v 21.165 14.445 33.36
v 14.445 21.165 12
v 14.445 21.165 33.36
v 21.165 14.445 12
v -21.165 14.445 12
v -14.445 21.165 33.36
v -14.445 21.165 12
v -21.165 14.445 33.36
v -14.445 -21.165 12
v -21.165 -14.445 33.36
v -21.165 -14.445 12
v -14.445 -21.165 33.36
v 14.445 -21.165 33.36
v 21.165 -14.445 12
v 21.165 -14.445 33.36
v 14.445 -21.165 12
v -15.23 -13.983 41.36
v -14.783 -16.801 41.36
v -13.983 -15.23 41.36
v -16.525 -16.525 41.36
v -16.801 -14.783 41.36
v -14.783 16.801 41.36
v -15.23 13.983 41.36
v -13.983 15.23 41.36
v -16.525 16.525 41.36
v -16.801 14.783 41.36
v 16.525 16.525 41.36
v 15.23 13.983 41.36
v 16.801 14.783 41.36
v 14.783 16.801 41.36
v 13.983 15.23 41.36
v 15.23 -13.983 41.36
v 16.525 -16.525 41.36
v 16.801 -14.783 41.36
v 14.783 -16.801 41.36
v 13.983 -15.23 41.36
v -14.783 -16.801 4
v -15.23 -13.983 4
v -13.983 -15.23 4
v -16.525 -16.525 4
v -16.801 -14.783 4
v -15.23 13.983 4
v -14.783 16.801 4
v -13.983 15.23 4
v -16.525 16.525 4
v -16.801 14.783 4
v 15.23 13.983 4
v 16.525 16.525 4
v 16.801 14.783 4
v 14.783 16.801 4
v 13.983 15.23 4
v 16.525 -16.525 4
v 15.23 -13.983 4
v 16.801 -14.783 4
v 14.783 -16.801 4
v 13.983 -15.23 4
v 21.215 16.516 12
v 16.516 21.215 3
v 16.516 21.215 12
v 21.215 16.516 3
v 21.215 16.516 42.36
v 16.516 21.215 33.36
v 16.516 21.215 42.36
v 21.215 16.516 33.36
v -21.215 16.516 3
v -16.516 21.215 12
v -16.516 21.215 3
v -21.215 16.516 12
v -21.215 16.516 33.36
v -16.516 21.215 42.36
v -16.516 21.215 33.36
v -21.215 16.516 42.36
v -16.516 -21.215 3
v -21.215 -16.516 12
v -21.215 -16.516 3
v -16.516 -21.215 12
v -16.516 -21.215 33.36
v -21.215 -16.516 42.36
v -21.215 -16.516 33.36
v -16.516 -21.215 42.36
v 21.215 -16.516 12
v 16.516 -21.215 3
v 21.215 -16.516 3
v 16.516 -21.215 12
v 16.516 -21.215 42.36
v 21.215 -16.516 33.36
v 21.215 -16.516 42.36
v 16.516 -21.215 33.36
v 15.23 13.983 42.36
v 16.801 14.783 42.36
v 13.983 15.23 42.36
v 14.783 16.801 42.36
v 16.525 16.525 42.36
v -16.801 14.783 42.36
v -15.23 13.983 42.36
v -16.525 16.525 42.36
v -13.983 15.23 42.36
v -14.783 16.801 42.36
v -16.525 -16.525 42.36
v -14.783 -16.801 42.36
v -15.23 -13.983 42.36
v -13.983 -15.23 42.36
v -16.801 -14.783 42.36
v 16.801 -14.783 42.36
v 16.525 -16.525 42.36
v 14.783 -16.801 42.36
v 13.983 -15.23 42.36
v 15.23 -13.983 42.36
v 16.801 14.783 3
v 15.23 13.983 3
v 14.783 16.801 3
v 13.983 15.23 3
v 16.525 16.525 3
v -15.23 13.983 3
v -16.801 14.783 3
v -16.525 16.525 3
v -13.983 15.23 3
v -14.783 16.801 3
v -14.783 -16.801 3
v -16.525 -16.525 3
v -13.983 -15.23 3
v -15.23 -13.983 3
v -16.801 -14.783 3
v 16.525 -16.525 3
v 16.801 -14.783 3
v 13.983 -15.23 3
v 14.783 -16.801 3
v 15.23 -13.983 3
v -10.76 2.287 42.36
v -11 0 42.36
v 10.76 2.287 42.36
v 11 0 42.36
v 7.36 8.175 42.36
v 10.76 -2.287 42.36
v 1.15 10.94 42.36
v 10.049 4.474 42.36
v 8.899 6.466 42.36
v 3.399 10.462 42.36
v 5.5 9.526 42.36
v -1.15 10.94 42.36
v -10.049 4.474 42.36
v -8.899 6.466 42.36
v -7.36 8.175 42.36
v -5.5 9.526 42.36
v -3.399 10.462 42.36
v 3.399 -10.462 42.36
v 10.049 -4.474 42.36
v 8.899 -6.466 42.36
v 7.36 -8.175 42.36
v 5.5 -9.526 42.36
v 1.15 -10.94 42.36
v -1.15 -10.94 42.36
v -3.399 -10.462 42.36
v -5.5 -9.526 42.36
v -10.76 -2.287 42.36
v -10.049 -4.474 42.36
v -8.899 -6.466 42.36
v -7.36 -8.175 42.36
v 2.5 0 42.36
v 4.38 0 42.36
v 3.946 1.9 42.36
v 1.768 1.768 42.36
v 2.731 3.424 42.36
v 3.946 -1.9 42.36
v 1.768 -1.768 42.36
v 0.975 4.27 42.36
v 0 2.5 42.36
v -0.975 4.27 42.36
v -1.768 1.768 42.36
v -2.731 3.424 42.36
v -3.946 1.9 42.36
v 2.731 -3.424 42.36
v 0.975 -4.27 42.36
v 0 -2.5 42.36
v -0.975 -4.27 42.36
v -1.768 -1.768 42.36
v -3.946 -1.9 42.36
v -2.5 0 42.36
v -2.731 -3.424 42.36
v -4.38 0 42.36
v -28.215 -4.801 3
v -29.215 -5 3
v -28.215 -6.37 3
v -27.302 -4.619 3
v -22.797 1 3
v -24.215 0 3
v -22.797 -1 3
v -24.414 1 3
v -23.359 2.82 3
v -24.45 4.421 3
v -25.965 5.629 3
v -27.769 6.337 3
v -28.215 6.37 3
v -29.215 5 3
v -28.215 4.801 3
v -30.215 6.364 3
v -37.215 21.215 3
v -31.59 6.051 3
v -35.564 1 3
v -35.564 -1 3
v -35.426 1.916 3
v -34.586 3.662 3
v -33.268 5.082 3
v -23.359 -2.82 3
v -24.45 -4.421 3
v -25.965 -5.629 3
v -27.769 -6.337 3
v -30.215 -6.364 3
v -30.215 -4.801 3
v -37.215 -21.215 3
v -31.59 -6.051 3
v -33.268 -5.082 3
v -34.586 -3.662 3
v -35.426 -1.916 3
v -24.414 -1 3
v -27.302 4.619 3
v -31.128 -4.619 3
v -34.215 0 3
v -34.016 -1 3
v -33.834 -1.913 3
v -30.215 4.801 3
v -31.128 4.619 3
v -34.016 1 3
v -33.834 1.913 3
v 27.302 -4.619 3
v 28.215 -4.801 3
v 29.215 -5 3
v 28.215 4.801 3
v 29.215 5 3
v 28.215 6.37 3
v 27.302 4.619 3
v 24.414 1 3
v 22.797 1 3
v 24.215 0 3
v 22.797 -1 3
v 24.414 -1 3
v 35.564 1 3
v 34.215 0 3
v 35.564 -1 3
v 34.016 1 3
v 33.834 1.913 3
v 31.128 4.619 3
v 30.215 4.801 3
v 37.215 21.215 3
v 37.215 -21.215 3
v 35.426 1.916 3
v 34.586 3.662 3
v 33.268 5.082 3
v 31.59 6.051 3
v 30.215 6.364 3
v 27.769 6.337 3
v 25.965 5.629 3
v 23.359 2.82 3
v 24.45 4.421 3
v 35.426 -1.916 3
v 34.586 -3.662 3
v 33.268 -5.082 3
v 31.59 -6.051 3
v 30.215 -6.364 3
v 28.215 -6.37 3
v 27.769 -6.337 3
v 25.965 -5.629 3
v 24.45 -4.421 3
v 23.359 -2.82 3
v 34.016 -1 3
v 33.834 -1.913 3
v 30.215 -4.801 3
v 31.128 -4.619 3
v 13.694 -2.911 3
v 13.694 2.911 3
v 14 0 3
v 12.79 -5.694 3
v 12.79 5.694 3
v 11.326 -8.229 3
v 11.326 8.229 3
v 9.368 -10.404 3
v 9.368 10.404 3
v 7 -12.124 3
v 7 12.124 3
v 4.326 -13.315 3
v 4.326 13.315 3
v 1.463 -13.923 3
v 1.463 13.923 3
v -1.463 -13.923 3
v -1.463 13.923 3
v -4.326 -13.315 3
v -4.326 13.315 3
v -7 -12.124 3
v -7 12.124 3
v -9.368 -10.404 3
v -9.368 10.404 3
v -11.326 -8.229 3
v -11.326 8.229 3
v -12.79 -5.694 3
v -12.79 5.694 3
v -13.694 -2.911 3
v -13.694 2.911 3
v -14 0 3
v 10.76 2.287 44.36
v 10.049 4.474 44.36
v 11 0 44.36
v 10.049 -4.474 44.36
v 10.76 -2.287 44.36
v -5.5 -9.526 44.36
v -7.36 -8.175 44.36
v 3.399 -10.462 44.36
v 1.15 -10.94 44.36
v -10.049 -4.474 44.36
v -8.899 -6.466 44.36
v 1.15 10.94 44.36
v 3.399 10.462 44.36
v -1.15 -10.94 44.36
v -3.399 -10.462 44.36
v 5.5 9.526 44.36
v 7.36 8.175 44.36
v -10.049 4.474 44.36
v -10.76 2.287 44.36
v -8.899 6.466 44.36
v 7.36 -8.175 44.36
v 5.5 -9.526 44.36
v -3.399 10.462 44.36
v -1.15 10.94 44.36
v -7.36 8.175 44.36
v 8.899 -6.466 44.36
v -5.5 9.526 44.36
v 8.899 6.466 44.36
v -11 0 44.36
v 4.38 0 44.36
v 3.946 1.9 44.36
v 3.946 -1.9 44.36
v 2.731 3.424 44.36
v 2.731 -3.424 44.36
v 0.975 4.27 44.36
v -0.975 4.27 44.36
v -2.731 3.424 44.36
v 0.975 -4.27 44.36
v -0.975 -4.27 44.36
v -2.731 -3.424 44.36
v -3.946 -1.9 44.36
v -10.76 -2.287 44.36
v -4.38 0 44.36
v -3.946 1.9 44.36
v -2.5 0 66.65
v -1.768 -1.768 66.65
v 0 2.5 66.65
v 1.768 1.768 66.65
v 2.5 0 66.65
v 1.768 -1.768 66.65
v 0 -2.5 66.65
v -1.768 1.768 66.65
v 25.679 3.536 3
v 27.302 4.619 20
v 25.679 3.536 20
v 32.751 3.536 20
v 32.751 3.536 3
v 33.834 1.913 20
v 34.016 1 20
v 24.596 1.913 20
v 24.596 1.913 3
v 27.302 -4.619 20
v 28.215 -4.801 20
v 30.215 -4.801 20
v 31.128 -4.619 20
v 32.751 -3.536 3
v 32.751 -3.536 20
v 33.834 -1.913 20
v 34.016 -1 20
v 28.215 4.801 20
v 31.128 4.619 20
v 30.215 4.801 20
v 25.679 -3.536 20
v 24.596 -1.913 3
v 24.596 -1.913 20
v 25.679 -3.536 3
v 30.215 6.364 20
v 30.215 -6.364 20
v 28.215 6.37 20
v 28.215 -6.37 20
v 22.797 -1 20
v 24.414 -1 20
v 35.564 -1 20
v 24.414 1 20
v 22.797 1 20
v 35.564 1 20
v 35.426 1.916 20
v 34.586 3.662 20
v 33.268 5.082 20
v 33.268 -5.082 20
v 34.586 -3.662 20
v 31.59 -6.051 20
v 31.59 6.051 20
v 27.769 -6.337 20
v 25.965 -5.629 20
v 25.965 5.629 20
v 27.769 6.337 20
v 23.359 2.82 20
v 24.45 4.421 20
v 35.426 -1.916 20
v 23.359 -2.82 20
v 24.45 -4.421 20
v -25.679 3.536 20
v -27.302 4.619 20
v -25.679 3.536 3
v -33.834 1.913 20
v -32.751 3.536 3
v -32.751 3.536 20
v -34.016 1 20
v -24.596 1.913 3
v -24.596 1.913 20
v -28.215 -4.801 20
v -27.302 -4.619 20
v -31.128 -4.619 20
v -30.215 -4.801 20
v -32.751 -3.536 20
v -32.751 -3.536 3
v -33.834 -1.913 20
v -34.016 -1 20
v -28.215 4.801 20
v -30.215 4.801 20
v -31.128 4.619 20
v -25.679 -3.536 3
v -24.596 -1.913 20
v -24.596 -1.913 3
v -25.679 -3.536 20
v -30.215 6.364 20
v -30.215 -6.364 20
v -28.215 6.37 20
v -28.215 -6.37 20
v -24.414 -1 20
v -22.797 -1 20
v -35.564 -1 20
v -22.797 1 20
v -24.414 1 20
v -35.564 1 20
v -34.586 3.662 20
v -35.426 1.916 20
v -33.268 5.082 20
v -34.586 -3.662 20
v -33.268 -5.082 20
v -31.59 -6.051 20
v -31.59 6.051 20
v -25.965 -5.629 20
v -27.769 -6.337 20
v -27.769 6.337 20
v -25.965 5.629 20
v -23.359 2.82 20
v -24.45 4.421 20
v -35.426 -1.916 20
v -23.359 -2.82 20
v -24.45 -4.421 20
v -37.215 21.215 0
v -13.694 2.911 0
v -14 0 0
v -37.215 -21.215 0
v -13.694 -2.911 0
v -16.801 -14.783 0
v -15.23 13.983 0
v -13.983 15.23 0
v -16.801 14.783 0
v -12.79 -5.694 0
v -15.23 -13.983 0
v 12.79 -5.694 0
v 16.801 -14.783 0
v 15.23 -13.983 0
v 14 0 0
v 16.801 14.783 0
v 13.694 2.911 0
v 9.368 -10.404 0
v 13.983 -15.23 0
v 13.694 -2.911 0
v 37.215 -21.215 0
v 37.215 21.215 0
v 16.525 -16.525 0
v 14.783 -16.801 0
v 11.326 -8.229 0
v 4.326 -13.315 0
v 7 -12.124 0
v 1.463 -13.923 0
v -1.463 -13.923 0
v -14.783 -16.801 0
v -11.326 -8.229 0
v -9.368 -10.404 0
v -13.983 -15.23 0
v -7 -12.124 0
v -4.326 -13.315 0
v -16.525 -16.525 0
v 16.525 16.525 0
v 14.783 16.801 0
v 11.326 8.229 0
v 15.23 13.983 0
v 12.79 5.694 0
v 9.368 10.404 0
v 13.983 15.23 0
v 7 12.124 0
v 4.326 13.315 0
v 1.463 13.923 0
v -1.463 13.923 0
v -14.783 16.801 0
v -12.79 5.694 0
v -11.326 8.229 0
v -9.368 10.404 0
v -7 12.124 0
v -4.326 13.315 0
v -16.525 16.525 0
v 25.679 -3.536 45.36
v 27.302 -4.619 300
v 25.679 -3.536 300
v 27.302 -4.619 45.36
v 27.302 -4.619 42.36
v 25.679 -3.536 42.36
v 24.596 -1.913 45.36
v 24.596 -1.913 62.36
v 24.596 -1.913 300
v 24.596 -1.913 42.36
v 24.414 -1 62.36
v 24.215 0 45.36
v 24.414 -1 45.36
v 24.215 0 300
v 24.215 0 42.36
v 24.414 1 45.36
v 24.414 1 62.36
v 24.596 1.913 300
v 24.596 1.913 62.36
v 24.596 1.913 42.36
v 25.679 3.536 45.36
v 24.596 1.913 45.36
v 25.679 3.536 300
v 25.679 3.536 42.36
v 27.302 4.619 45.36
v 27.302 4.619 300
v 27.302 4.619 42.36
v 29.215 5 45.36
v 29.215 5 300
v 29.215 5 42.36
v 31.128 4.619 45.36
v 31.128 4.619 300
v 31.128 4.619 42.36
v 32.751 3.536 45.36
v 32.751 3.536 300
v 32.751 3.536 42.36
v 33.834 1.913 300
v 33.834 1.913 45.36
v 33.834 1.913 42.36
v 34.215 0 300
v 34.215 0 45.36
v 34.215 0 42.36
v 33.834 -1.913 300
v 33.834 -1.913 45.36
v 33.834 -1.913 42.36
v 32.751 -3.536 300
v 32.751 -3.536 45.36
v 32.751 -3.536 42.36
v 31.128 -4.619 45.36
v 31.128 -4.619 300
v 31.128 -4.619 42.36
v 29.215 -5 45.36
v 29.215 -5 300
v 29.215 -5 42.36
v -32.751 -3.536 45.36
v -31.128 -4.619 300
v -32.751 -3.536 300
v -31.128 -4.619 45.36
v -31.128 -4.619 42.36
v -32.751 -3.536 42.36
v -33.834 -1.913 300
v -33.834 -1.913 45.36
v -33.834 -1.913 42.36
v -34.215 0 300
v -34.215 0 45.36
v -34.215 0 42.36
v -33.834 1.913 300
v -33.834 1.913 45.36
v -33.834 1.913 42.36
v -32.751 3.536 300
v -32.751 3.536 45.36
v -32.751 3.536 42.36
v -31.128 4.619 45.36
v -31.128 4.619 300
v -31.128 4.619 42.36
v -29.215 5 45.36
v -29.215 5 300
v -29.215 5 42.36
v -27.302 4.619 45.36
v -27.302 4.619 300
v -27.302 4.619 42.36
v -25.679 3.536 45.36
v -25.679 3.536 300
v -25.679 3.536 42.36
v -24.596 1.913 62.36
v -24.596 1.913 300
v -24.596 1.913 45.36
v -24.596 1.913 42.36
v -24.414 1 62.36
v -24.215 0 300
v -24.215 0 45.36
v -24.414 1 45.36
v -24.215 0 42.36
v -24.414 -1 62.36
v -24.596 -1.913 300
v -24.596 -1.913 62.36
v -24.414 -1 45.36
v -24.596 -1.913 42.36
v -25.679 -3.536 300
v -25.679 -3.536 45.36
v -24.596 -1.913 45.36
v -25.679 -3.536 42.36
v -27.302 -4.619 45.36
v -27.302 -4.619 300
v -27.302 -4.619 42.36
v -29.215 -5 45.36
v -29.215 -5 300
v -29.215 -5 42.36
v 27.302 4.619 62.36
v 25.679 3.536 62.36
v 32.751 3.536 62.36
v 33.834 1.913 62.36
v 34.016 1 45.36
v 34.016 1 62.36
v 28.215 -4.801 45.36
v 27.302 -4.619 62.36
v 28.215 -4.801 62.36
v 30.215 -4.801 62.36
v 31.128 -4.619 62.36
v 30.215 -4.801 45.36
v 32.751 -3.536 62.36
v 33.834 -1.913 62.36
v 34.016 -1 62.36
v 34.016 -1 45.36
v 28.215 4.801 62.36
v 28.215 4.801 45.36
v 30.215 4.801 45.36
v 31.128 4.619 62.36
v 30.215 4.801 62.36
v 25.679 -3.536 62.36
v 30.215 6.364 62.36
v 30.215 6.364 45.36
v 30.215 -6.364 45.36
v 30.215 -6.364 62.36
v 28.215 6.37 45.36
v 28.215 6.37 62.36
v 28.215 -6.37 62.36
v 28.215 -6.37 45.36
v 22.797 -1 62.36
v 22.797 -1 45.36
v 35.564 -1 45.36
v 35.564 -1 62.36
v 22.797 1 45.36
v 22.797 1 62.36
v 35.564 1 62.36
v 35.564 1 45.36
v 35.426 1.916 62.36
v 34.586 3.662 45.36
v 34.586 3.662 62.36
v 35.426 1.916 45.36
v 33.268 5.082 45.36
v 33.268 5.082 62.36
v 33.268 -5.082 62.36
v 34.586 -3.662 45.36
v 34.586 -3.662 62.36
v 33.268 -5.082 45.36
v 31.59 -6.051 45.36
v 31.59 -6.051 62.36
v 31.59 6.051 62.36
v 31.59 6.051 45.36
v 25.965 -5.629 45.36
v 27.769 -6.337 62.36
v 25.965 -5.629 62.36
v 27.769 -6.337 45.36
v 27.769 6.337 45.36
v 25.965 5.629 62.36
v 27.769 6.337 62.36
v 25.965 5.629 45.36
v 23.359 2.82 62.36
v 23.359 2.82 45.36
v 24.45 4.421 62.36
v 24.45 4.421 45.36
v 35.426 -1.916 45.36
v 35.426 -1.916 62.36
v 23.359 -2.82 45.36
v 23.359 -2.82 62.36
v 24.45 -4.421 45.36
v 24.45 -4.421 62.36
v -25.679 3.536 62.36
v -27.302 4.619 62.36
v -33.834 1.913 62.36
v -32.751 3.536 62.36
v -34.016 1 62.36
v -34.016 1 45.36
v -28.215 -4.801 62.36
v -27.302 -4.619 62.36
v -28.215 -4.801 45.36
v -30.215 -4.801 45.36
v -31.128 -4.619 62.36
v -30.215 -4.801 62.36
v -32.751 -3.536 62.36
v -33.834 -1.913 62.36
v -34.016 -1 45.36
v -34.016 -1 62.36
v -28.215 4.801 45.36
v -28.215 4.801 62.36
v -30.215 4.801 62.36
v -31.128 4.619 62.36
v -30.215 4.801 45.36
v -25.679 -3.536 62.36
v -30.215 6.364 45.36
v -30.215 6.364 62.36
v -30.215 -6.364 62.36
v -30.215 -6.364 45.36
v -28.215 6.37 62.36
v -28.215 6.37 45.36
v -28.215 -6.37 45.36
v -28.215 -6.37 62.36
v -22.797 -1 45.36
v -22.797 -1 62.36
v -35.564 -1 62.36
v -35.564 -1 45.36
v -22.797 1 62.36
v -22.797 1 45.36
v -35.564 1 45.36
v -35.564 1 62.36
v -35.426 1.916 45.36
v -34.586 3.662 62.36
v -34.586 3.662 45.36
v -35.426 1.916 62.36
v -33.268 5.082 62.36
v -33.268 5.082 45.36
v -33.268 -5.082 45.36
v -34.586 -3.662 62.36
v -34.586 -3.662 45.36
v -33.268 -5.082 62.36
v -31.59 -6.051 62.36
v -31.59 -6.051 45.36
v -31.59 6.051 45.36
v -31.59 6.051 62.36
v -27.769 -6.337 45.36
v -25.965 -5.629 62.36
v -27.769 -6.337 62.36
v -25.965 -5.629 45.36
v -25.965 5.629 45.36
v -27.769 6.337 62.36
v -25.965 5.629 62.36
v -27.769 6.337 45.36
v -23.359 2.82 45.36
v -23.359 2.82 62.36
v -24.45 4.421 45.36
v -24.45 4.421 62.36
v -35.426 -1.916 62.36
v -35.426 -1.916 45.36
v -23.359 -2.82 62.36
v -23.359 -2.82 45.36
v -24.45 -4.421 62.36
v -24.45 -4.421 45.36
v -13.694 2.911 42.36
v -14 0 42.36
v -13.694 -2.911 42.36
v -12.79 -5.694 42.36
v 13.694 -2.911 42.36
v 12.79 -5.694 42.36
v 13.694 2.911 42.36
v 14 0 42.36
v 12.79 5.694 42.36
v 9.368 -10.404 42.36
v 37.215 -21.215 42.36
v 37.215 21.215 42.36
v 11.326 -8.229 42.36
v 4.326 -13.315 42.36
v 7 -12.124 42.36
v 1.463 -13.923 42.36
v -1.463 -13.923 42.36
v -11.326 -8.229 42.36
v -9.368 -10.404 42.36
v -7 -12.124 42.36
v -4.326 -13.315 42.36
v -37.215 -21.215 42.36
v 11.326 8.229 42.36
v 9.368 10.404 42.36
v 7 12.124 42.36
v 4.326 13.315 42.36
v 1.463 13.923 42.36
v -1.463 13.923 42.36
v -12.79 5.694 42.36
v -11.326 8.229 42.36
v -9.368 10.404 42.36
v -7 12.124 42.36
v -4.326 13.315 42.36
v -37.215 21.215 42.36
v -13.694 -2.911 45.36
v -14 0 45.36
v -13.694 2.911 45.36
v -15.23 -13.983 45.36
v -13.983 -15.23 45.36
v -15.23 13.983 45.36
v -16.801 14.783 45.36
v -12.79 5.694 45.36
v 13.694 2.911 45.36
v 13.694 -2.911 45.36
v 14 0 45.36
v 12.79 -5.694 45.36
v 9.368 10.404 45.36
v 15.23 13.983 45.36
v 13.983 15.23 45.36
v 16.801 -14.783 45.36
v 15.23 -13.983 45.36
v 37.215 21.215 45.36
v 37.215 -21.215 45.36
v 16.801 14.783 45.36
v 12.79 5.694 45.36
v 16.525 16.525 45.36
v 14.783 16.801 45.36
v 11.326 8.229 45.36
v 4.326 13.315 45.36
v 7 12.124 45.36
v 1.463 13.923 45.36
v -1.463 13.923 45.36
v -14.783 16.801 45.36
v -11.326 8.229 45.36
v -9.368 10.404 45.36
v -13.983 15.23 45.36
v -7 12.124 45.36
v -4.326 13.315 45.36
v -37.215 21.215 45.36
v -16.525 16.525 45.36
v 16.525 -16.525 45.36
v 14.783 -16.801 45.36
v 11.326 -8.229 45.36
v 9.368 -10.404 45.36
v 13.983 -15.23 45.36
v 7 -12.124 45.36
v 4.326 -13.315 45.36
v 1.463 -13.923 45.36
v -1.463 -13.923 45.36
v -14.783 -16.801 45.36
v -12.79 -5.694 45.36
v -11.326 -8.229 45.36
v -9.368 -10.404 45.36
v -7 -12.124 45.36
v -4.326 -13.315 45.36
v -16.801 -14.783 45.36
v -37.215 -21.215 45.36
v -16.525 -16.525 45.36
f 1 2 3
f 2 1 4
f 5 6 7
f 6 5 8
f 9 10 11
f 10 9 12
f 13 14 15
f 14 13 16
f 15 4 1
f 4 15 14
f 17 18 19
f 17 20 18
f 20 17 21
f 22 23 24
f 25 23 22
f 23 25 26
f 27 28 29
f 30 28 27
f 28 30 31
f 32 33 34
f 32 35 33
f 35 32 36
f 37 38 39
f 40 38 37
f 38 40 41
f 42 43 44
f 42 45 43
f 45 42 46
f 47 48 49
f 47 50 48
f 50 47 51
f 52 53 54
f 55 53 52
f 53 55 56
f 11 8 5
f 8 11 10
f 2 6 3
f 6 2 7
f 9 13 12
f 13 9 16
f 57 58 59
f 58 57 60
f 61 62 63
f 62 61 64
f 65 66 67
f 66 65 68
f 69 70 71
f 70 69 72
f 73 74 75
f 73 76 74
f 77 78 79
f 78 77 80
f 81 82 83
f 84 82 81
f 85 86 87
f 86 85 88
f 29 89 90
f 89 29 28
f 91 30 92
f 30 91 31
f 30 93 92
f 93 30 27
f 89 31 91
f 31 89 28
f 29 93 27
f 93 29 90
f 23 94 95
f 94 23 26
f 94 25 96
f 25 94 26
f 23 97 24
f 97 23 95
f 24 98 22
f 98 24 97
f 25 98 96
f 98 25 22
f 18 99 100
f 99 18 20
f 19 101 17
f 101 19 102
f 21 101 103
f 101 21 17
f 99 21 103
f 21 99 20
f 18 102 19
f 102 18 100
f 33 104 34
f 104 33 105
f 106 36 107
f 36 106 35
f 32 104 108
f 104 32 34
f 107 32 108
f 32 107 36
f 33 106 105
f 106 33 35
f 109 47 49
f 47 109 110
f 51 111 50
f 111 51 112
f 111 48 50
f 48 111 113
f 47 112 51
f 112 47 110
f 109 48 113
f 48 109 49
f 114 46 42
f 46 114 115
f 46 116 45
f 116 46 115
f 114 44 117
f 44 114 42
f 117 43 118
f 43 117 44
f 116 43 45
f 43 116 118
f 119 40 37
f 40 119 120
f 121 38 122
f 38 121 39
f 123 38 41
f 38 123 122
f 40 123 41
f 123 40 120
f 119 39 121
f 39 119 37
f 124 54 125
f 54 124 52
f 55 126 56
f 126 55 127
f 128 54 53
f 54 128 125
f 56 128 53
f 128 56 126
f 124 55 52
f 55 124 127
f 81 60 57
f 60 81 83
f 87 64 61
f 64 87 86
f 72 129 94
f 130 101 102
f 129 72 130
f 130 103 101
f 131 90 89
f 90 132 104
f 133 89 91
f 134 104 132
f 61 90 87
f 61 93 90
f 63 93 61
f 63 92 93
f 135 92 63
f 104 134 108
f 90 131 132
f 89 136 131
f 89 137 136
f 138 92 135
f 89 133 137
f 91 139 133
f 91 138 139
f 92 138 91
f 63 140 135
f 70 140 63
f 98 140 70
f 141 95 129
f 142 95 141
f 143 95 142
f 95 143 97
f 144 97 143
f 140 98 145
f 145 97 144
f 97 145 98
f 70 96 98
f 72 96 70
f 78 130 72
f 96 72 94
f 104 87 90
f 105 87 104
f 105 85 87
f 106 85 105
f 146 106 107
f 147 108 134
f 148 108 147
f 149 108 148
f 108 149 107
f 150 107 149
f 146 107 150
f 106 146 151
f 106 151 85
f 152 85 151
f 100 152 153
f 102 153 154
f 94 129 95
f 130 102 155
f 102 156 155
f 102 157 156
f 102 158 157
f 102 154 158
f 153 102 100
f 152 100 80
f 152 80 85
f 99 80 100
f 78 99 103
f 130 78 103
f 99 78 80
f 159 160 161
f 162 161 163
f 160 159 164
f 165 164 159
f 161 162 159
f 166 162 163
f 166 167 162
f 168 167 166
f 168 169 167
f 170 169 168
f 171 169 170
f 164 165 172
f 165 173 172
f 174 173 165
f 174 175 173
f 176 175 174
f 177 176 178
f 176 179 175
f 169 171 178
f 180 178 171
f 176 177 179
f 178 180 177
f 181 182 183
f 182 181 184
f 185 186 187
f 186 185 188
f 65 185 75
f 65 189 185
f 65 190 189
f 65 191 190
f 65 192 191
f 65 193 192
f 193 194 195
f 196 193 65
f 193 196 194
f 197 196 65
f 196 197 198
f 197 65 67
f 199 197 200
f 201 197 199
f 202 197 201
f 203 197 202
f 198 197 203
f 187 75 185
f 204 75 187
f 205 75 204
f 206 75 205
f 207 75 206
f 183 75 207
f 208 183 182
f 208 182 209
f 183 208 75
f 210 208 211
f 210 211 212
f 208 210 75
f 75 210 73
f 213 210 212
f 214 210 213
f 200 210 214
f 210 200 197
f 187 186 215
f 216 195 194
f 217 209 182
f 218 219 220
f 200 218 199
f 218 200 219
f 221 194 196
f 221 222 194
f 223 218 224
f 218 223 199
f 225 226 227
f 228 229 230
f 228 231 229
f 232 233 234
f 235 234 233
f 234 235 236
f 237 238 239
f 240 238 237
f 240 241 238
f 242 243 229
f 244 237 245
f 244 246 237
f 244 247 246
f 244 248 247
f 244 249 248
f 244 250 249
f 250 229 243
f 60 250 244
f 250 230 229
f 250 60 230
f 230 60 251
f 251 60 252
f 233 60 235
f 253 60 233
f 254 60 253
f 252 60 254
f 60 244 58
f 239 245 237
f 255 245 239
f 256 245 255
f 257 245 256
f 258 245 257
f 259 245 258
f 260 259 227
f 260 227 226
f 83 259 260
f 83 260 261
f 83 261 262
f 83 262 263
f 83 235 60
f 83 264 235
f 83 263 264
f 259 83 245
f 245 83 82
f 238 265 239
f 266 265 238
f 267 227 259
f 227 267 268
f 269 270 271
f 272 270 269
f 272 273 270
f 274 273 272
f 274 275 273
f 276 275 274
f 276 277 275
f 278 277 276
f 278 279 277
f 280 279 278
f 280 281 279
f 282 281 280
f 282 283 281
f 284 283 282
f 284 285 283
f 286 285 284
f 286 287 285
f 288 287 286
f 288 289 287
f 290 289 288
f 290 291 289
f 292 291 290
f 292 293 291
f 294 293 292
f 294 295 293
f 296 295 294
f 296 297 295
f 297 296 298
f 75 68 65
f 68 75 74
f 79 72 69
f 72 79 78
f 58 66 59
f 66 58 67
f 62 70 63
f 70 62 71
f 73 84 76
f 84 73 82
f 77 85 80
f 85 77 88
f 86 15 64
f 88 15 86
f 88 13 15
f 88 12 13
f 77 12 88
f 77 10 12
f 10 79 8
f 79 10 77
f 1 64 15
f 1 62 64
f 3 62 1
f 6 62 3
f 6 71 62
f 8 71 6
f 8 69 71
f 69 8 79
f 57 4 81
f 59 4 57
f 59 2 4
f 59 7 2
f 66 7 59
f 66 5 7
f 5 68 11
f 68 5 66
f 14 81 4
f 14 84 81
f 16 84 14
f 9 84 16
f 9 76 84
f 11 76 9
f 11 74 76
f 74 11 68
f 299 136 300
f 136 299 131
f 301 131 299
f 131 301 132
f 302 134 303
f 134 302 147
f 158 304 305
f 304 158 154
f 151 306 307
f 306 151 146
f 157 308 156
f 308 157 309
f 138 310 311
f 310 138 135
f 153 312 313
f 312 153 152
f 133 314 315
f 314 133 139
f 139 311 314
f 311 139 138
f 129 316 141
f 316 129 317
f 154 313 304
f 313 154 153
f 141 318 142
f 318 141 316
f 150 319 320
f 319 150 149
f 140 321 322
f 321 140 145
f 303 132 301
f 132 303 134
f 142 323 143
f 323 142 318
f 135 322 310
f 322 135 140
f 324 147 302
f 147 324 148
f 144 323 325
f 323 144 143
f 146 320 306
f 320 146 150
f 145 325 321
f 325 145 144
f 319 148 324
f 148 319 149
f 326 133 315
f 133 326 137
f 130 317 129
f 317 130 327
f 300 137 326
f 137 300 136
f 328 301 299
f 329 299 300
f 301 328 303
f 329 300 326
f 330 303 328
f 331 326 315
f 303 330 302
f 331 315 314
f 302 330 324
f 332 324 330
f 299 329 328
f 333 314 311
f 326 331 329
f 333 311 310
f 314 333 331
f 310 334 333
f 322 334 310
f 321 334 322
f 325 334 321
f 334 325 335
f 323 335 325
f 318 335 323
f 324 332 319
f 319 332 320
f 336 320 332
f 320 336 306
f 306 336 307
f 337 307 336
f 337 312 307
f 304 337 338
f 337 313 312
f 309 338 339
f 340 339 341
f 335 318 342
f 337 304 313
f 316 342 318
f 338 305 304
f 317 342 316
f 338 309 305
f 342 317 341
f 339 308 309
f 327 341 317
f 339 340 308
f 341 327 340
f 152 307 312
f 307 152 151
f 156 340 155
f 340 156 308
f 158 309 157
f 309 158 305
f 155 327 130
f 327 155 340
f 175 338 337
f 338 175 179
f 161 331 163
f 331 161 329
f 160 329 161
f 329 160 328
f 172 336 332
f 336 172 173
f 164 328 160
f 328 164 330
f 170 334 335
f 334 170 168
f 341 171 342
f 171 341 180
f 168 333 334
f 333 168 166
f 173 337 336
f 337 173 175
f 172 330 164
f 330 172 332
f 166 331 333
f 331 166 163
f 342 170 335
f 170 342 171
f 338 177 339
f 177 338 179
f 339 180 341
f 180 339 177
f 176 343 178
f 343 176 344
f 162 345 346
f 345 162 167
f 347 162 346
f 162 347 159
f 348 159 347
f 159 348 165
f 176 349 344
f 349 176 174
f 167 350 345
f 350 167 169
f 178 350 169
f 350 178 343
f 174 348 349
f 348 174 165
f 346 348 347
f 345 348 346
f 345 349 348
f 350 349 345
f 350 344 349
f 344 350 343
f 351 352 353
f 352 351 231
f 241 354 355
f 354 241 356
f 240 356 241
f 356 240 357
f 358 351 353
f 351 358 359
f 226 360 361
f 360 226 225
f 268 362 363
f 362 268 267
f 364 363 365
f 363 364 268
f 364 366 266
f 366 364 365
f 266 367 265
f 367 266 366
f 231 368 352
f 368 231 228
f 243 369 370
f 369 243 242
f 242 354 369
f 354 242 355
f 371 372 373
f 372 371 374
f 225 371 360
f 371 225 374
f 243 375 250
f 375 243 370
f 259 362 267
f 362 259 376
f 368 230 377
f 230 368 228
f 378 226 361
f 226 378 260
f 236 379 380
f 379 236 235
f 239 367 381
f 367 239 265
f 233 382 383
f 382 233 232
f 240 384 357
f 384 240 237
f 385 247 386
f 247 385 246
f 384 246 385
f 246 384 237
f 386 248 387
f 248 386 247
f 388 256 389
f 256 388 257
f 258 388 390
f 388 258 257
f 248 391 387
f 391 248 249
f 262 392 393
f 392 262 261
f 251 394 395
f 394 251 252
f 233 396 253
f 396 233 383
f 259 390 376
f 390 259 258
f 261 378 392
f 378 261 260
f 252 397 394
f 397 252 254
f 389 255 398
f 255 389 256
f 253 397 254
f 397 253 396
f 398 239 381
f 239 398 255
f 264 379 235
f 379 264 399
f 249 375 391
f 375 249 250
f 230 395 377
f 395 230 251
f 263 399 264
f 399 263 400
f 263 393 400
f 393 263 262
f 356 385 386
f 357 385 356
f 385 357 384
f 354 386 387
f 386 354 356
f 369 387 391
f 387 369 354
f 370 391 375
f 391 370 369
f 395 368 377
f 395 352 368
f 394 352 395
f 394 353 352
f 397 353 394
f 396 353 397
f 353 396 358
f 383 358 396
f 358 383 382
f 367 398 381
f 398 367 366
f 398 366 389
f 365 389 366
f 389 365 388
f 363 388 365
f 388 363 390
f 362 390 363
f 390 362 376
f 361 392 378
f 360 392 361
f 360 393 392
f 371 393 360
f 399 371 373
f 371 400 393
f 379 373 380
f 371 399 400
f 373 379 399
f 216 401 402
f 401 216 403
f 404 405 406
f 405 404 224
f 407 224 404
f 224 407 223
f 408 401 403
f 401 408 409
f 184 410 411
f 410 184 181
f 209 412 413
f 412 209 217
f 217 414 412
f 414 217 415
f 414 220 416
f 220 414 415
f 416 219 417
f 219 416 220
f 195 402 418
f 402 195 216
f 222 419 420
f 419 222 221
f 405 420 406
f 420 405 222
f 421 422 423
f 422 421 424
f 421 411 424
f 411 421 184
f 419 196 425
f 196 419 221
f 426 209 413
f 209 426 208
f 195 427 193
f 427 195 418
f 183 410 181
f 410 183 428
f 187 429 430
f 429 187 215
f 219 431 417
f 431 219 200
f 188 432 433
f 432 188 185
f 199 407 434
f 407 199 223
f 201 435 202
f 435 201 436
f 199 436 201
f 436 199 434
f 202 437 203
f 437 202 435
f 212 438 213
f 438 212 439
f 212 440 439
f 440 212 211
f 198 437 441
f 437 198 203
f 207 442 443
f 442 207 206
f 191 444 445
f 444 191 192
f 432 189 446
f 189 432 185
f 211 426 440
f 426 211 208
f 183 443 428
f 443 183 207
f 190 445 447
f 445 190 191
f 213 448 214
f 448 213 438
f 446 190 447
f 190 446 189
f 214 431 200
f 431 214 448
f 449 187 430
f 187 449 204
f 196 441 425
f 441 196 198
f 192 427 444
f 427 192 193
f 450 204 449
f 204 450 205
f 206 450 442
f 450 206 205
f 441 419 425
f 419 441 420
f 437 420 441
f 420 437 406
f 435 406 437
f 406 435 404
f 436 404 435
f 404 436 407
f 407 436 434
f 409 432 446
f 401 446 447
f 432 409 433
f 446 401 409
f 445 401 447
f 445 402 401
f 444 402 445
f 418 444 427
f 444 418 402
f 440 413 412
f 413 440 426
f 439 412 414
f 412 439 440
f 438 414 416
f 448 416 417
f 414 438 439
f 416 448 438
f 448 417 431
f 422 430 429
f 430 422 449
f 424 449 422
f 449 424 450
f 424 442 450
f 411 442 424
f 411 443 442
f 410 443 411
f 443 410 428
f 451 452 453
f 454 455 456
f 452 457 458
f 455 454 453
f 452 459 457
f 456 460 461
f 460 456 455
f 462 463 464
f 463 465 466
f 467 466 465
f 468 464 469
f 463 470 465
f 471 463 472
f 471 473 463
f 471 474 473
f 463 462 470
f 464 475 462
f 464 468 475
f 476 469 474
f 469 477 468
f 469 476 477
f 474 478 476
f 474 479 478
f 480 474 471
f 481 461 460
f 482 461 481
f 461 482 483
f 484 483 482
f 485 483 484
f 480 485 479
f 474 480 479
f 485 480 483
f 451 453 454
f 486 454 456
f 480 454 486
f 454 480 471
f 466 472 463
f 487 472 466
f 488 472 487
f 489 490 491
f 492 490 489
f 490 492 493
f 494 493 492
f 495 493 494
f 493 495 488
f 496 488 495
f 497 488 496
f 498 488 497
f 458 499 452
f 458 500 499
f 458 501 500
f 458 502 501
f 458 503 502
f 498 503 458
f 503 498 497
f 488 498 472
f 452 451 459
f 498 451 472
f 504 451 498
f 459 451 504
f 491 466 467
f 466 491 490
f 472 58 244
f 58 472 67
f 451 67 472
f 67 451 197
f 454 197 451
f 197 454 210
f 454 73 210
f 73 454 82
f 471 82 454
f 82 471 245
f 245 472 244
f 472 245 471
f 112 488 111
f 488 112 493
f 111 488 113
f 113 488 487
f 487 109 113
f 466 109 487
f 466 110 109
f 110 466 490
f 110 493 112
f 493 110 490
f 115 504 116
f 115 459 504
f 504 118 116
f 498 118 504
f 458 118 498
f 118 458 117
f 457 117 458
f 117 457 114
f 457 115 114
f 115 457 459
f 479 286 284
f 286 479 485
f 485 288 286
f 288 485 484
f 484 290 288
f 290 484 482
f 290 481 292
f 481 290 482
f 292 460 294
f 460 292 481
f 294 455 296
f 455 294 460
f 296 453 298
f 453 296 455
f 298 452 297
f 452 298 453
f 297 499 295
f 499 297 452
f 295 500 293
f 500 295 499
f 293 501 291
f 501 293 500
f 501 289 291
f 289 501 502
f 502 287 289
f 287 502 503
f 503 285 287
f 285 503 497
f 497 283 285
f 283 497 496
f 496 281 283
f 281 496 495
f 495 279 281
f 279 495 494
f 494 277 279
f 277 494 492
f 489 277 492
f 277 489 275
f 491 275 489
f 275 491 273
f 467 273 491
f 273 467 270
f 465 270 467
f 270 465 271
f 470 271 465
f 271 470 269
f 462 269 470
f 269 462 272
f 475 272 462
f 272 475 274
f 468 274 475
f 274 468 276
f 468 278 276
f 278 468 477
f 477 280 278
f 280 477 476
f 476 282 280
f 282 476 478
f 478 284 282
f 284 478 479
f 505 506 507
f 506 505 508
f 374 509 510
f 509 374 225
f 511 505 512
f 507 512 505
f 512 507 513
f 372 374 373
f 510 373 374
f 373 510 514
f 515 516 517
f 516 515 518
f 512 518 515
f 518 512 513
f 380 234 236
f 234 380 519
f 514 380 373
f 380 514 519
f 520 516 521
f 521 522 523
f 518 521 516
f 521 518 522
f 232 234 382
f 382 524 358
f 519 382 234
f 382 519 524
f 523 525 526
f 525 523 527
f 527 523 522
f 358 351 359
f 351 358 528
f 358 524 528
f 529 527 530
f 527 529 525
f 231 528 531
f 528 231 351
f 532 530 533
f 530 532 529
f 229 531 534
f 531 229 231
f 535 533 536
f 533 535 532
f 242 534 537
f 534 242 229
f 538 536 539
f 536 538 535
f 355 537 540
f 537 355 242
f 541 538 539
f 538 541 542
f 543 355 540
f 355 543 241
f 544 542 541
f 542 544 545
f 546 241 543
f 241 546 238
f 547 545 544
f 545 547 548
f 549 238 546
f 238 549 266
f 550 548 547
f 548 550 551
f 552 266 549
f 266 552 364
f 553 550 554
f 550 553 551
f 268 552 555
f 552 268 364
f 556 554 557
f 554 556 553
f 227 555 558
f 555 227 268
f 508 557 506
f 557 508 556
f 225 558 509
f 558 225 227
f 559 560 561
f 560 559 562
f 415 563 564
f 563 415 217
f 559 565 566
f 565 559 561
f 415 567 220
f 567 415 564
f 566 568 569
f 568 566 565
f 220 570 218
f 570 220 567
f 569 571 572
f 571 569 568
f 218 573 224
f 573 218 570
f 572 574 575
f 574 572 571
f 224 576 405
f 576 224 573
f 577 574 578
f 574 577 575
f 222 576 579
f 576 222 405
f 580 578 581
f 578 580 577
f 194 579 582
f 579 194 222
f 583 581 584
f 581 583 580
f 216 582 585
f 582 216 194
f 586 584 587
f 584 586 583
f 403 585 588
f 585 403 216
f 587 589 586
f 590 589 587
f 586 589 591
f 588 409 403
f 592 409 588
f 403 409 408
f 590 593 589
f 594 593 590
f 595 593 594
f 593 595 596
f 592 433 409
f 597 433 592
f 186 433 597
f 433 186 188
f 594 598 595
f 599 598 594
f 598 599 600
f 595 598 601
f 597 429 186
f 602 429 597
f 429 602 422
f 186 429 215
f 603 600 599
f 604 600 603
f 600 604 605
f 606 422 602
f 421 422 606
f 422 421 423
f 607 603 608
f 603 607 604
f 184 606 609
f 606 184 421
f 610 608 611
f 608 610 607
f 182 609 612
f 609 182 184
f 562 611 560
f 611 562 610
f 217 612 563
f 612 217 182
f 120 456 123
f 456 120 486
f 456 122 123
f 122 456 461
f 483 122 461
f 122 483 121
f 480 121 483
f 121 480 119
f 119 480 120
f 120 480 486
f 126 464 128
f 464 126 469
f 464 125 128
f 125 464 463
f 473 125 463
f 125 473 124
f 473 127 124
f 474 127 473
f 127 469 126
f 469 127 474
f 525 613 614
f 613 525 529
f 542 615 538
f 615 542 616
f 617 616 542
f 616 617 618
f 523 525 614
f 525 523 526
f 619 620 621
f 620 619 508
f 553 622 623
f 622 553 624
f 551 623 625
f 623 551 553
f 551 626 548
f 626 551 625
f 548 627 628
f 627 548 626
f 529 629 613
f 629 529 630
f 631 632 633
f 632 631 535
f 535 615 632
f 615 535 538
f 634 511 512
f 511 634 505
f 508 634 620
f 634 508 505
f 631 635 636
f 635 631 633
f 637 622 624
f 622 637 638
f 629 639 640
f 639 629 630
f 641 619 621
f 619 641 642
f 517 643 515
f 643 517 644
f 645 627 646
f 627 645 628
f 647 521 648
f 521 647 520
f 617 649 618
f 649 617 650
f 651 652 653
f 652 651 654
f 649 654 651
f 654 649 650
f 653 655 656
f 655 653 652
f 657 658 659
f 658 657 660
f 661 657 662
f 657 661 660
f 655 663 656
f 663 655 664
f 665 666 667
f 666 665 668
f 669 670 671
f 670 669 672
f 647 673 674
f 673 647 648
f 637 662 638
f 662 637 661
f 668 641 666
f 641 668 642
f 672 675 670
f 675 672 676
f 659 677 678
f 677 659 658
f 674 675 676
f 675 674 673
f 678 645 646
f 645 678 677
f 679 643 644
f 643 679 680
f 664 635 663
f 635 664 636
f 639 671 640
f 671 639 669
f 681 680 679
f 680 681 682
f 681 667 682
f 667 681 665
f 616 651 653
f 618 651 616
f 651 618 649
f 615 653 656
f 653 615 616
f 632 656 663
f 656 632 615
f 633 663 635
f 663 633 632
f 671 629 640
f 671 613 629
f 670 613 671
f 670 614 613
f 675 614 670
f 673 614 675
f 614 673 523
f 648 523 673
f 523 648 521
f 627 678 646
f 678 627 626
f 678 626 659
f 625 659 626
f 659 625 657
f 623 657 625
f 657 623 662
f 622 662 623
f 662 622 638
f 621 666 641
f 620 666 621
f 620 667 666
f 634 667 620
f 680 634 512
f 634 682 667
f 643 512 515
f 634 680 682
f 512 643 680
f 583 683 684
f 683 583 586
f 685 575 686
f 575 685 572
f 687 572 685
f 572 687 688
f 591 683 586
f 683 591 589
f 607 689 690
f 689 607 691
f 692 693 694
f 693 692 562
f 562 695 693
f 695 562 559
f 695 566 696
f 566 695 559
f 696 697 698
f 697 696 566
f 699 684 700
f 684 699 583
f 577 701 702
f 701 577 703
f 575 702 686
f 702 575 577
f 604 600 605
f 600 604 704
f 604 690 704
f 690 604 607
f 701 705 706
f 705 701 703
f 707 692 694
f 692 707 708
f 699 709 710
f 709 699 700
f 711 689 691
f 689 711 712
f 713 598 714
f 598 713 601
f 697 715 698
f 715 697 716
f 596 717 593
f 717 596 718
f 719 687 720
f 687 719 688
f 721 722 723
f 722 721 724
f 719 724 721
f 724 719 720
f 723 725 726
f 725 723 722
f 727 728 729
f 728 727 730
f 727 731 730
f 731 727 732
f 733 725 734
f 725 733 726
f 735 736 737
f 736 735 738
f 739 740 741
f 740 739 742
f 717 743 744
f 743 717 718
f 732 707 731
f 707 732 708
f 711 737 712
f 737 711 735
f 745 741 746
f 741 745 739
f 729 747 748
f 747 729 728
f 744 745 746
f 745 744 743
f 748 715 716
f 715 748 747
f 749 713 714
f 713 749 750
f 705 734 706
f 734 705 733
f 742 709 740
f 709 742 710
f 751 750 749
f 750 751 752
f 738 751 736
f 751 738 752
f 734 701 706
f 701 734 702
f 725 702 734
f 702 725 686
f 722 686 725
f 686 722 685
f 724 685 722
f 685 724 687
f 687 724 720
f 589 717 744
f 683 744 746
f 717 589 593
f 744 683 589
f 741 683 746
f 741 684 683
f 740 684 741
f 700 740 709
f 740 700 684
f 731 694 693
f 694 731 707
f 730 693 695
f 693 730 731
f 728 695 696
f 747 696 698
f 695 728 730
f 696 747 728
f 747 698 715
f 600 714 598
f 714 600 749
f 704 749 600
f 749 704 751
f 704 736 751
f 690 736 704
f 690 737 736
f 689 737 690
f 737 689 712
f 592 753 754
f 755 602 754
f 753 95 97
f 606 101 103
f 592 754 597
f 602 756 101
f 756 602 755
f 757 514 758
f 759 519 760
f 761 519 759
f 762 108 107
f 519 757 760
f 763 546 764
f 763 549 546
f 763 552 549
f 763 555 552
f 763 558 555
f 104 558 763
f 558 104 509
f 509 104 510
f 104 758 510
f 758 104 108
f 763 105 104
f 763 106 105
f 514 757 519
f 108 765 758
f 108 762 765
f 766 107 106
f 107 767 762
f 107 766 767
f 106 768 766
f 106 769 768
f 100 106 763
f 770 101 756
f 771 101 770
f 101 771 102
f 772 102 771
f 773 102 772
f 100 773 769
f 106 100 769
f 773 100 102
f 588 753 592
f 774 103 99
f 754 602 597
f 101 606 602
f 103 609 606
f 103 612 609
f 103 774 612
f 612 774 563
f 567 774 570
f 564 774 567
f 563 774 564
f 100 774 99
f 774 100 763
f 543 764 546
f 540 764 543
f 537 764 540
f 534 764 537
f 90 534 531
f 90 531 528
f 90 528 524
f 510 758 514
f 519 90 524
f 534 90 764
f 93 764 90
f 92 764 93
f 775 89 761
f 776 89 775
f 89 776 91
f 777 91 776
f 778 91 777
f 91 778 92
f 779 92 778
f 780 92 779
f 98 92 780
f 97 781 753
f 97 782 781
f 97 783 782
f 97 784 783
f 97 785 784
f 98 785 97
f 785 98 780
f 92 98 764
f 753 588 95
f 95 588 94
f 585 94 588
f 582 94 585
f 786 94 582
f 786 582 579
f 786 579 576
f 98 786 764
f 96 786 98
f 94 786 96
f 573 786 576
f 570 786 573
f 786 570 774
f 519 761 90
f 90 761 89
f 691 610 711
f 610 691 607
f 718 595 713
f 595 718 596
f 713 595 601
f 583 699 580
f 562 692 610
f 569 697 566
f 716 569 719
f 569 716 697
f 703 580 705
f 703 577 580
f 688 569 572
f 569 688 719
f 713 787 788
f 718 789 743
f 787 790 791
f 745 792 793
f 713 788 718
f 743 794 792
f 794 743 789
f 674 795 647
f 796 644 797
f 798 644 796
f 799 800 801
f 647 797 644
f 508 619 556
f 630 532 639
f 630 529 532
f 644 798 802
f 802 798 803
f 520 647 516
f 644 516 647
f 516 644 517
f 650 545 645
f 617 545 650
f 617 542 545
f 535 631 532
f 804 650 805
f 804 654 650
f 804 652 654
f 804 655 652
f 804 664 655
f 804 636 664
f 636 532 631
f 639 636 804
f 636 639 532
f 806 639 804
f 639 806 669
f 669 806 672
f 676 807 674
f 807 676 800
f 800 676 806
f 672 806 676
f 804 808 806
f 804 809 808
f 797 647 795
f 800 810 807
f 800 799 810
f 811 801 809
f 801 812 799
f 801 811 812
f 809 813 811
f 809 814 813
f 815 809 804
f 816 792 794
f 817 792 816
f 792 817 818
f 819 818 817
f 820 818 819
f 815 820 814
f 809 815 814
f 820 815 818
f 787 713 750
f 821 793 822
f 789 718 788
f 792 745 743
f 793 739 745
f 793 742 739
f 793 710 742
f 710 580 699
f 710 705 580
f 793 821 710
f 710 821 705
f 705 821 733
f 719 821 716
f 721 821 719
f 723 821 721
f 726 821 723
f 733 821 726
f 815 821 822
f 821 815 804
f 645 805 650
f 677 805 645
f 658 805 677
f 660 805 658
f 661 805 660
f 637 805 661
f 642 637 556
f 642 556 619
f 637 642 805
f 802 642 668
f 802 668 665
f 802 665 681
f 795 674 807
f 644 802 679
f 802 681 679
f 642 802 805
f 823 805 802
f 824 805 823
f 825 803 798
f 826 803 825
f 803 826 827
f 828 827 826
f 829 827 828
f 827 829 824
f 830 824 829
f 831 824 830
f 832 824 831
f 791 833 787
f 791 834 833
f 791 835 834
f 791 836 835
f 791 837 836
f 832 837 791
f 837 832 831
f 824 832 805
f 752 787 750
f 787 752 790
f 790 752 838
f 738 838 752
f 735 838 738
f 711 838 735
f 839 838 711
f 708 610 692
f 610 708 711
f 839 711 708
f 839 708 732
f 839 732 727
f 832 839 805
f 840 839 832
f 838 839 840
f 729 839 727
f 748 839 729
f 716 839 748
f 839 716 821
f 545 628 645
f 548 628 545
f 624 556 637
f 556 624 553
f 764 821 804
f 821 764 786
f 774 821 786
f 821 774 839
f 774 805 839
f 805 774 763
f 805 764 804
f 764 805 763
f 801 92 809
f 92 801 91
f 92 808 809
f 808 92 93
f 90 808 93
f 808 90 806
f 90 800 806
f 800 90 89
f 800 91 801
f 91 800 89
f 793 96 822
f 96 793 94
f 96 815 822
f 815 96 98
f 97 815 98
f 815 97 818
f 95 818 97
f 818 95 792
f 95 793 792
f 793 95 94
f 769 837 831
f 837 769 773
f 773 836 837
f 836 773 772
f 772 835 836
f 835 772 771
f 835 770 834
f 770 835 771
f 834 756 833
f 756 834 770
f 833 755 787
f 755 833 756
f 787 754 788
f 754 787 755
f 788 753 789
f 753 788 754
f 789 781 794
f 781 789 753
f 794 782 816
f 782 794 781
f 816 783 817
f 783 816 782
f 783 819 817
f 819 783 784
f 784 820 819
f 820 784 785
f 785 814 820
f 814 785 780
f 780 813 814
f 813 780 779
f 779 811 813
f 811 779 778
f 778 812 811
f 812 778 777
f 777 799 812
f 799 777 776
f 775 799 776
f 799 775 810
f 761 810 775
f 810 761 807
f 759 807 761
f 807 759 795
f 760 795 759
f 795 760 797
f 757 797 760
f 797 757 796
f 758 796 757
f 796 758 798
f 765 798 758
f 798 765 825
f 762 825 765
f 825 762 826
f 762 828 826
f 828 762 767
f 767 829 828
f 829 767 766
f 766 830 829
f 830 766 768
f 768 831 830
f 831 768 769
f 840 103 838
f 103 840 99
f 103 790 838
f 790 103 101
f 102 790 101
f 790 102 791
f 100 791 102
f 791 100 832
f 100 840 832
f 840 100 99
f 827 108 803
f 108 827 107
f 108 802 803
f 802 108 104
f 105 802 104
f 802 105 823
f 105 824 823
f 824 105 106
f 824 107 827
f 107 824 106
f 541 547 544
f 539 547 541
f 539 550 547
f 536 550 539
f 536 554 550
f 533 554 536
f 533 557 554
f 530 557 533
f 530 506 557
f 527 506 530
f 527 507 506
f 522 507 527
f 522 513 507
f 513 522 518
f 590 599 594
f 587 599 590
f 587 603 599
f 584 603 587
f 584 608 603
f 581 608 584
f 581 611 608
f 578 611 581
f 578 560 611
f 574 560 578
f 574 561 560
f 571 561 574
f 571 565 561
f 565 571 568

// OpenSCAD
// file: util.scad
include <Measured_numbers.scad>

module Nema17_screw_translate(){
  for (i=[0:90:359]){
    rotate([0,0,i+45]) translate([Nema17_screw_hole_width/2,0,0]) children(0);
  }
}

module Nema17_screw_holes(r, h){
  Nema17_screw_translate() cylinder(r=r, h=h);
}
//Nema17_screw_holes(M3_diameter/2, 15);

module Nema17_screw_holes_2d(r=1.5){
  Nema17_screw_translate() circle(r=r);
}
//Nema17_screw_holes(M3_diameter, 15);

module Nema17(){
  cw = Nema17_cube_width;
  ch = Nema17_cube_height;
  sh = Nema17_shaft_height;
  union(){
    color("black")
    difference(){
      translate([-(cw-0.1)/2,-(cw-0.1)/2,1]) cube([cw-0.1,cw-0.1,ch-2]);
      for (i=[0:90:359]){ // Corner cuts black cube
        rotate([0,0,i+45]) translate([50.36/2,-cw/2,-1]) cube([cw,cw,ch+2]);
      }
    }
    color("silver")
    difference(){
      translate([-cw/2,-cw/2,0]) cube([cw,cw,ch]);
      for (i=[0:90:359]){ // Corner cuts silver cube
        rotate([0,0,i+45]) translate([53.36/2,-cw/2,-1]) cube([cw,cw,ch+2]);
      }
      translate([0,0,ch-5]) Nema17_screw_holes(M3_diameter/2, h=10);
      translate([0,0,-5]) Nema17_screw_holes(M3_diameter/2, h=10);
      translate([-cw,-cw,9]) cube([2*cw,2*cw,ch-18]);
    }
    color("silver")
    difference(){
      cylinder(r=Nema17_ring_radius, h=ch+Nema17_ring_height);
      translate([0,0,1]) cylinder(r=8.76/2, h=ch+Nema17_ring_height);
    }
    color("silver")
      cylinder(r=5/2, h=sh);
  }
}
Nema17();
// file: Design_numbers.scad
Steel_thickness = 3;
Smooth_rod_r = 5; // 10 mm diameter
Smooth_rod_length = 300;
Clamp_height = 20;
Plastic_thickness = 3;

Ball_screw_r = 4;
// file: Measured_numbers.scad
// Measured numbers are collected from other parts' blueprints,
// or measured with calipers
// they're stored and named here

Nema17_cube_width          = 42.43;
Nema17_cube_height         = 39.36;
Nema17_shaft_height        = 63.65;
Nema17_screw_hole_width    = 43.74; // Opposite corner screws
Nema17_ring_radius         = 11;
Nema17_ring_height         = 2;
Nema17_screw_hole_dist     = Nema17_screw_hole_width/sqrt(2);
Nema17_screw_hole_diameter = 5.92;
Nema17_screw_hole_depth    = 2.25;
Nema17_motor_shaft         = 5;

M3_diameter                = 3;
M3_head_diameter           = 6.3;
M3_head_height             = 2.5;
// main file
include <Measured_numbers.scad>
include <Design_numbers.scad>
use <util.scad>

// 2D drawing of smooth rods in the XY plane, centered
// s: Distance between centers
// r: radius of rods
module smooth_rods_2d(s, r){
  for(k=[0,1])
    mirror([k,0])
      translate([s/2,0])
      circle(r=r);
}
//smooth_rods_2d(20,3);

// Pair of smooth rods, centered
// smooth_rod_separation: Between smooth rod centers
// r: radius of rods
// h: length of rods
module smooth_rods(smooth_rod_separation, h, r){
  color("silver")
    linear_extrude(height=h, slices=1)
    smooth_rods_2d(smooth_rod_separation, r);
}
//smooth_rods(20, 30, 3);

// 2D drawing of plates attached to stepper motors
// s: XY size of plate (vector or scalar)
// smooth_rod_separation: Between smooth rod centers
module l_plate_2d(s, smooth_rod_separation){
  difference(){
    square(s, center=true);
    Nema17_screw_holes_2d();
    // Holes for smooth rods
    smooth_rods_2d(smooth_rod_separation, Smooth_rod_r);
    circle(r=Nema17_ring_radius+3);
  }
}
//l_plate_2d([Nema17_cube_width+4*(Smooth_rod_r+3),Nema17_cube_width],
//            Nema17_cube_width+2*(Smooth_rod_r+3));

// Plates attached to stepper motors
// s: XY size of plate (vector or scalar)
// smooth_rod_separation: Between smooth rod centers
// h: Height of clamping cylinders
module l_plate(s, smooth_rod_separation, h){
  big = 100;
  // Show rods (use for rendering only)
  // XY plate
  linear_extrude(height=Plastic_thickness)
    l_plate_2d(s, smooth_rod_separation);
  // Clamps for smooth rods
  for(k=[0,1])
    mirror([k,0])
      translate([smooth_rod_separation/2,0,0])
      difference(){
        translate([0,0,1])
          // Outer clamp cylinder
          cylinder(r=Smooth_rod_r+1.5, h=h-1);
        translate([0,0,-1]){
          // Inner clamp cylinder
          cylinder(r=Smooth_rod_r, h=h+3);
          // Grooves to let clamp flex
          cube([2,big,big],center=true);
          rotate([0,0,90])
            cube([2,big,big],center=true);
        }
      }
}
//l_plate([Nema17_cube_width+4*(Smooth_rod_r+3),Nema17_cube_width],
//         Nema17_cube_width+2*(Smooth_rod_r+3),
//         Clamp_heigth);

// smooth_rod_separation: Between smooth rod centers
// show_motor: if true, render motor
// show_rods: if true, render rods
module l_module(smooth_rod_separation,show_motor=true,show_rods=true){
  if(show_rods){
    smooth_rods(smooth_rod_separation,Smooth_rod_length,Smooth_rod_r);
  }
  // Place l_plates over and below
  if(show_motor){
    translate([0,0,Plastic_thickness])
      Nema17();
  }
  for(k=[0,Nema17_cube_height+Plastic_thickness])
    translate([0,0,k])
      l_plate([Nema17_cube_width+4*(Smooth_rod_r+3),Nema17_cube_width],
              smooth_rod_separation,
              Clamp_height);
}
l_module(Nema17_cube_width+2*(Smooth_rod_r+3));
